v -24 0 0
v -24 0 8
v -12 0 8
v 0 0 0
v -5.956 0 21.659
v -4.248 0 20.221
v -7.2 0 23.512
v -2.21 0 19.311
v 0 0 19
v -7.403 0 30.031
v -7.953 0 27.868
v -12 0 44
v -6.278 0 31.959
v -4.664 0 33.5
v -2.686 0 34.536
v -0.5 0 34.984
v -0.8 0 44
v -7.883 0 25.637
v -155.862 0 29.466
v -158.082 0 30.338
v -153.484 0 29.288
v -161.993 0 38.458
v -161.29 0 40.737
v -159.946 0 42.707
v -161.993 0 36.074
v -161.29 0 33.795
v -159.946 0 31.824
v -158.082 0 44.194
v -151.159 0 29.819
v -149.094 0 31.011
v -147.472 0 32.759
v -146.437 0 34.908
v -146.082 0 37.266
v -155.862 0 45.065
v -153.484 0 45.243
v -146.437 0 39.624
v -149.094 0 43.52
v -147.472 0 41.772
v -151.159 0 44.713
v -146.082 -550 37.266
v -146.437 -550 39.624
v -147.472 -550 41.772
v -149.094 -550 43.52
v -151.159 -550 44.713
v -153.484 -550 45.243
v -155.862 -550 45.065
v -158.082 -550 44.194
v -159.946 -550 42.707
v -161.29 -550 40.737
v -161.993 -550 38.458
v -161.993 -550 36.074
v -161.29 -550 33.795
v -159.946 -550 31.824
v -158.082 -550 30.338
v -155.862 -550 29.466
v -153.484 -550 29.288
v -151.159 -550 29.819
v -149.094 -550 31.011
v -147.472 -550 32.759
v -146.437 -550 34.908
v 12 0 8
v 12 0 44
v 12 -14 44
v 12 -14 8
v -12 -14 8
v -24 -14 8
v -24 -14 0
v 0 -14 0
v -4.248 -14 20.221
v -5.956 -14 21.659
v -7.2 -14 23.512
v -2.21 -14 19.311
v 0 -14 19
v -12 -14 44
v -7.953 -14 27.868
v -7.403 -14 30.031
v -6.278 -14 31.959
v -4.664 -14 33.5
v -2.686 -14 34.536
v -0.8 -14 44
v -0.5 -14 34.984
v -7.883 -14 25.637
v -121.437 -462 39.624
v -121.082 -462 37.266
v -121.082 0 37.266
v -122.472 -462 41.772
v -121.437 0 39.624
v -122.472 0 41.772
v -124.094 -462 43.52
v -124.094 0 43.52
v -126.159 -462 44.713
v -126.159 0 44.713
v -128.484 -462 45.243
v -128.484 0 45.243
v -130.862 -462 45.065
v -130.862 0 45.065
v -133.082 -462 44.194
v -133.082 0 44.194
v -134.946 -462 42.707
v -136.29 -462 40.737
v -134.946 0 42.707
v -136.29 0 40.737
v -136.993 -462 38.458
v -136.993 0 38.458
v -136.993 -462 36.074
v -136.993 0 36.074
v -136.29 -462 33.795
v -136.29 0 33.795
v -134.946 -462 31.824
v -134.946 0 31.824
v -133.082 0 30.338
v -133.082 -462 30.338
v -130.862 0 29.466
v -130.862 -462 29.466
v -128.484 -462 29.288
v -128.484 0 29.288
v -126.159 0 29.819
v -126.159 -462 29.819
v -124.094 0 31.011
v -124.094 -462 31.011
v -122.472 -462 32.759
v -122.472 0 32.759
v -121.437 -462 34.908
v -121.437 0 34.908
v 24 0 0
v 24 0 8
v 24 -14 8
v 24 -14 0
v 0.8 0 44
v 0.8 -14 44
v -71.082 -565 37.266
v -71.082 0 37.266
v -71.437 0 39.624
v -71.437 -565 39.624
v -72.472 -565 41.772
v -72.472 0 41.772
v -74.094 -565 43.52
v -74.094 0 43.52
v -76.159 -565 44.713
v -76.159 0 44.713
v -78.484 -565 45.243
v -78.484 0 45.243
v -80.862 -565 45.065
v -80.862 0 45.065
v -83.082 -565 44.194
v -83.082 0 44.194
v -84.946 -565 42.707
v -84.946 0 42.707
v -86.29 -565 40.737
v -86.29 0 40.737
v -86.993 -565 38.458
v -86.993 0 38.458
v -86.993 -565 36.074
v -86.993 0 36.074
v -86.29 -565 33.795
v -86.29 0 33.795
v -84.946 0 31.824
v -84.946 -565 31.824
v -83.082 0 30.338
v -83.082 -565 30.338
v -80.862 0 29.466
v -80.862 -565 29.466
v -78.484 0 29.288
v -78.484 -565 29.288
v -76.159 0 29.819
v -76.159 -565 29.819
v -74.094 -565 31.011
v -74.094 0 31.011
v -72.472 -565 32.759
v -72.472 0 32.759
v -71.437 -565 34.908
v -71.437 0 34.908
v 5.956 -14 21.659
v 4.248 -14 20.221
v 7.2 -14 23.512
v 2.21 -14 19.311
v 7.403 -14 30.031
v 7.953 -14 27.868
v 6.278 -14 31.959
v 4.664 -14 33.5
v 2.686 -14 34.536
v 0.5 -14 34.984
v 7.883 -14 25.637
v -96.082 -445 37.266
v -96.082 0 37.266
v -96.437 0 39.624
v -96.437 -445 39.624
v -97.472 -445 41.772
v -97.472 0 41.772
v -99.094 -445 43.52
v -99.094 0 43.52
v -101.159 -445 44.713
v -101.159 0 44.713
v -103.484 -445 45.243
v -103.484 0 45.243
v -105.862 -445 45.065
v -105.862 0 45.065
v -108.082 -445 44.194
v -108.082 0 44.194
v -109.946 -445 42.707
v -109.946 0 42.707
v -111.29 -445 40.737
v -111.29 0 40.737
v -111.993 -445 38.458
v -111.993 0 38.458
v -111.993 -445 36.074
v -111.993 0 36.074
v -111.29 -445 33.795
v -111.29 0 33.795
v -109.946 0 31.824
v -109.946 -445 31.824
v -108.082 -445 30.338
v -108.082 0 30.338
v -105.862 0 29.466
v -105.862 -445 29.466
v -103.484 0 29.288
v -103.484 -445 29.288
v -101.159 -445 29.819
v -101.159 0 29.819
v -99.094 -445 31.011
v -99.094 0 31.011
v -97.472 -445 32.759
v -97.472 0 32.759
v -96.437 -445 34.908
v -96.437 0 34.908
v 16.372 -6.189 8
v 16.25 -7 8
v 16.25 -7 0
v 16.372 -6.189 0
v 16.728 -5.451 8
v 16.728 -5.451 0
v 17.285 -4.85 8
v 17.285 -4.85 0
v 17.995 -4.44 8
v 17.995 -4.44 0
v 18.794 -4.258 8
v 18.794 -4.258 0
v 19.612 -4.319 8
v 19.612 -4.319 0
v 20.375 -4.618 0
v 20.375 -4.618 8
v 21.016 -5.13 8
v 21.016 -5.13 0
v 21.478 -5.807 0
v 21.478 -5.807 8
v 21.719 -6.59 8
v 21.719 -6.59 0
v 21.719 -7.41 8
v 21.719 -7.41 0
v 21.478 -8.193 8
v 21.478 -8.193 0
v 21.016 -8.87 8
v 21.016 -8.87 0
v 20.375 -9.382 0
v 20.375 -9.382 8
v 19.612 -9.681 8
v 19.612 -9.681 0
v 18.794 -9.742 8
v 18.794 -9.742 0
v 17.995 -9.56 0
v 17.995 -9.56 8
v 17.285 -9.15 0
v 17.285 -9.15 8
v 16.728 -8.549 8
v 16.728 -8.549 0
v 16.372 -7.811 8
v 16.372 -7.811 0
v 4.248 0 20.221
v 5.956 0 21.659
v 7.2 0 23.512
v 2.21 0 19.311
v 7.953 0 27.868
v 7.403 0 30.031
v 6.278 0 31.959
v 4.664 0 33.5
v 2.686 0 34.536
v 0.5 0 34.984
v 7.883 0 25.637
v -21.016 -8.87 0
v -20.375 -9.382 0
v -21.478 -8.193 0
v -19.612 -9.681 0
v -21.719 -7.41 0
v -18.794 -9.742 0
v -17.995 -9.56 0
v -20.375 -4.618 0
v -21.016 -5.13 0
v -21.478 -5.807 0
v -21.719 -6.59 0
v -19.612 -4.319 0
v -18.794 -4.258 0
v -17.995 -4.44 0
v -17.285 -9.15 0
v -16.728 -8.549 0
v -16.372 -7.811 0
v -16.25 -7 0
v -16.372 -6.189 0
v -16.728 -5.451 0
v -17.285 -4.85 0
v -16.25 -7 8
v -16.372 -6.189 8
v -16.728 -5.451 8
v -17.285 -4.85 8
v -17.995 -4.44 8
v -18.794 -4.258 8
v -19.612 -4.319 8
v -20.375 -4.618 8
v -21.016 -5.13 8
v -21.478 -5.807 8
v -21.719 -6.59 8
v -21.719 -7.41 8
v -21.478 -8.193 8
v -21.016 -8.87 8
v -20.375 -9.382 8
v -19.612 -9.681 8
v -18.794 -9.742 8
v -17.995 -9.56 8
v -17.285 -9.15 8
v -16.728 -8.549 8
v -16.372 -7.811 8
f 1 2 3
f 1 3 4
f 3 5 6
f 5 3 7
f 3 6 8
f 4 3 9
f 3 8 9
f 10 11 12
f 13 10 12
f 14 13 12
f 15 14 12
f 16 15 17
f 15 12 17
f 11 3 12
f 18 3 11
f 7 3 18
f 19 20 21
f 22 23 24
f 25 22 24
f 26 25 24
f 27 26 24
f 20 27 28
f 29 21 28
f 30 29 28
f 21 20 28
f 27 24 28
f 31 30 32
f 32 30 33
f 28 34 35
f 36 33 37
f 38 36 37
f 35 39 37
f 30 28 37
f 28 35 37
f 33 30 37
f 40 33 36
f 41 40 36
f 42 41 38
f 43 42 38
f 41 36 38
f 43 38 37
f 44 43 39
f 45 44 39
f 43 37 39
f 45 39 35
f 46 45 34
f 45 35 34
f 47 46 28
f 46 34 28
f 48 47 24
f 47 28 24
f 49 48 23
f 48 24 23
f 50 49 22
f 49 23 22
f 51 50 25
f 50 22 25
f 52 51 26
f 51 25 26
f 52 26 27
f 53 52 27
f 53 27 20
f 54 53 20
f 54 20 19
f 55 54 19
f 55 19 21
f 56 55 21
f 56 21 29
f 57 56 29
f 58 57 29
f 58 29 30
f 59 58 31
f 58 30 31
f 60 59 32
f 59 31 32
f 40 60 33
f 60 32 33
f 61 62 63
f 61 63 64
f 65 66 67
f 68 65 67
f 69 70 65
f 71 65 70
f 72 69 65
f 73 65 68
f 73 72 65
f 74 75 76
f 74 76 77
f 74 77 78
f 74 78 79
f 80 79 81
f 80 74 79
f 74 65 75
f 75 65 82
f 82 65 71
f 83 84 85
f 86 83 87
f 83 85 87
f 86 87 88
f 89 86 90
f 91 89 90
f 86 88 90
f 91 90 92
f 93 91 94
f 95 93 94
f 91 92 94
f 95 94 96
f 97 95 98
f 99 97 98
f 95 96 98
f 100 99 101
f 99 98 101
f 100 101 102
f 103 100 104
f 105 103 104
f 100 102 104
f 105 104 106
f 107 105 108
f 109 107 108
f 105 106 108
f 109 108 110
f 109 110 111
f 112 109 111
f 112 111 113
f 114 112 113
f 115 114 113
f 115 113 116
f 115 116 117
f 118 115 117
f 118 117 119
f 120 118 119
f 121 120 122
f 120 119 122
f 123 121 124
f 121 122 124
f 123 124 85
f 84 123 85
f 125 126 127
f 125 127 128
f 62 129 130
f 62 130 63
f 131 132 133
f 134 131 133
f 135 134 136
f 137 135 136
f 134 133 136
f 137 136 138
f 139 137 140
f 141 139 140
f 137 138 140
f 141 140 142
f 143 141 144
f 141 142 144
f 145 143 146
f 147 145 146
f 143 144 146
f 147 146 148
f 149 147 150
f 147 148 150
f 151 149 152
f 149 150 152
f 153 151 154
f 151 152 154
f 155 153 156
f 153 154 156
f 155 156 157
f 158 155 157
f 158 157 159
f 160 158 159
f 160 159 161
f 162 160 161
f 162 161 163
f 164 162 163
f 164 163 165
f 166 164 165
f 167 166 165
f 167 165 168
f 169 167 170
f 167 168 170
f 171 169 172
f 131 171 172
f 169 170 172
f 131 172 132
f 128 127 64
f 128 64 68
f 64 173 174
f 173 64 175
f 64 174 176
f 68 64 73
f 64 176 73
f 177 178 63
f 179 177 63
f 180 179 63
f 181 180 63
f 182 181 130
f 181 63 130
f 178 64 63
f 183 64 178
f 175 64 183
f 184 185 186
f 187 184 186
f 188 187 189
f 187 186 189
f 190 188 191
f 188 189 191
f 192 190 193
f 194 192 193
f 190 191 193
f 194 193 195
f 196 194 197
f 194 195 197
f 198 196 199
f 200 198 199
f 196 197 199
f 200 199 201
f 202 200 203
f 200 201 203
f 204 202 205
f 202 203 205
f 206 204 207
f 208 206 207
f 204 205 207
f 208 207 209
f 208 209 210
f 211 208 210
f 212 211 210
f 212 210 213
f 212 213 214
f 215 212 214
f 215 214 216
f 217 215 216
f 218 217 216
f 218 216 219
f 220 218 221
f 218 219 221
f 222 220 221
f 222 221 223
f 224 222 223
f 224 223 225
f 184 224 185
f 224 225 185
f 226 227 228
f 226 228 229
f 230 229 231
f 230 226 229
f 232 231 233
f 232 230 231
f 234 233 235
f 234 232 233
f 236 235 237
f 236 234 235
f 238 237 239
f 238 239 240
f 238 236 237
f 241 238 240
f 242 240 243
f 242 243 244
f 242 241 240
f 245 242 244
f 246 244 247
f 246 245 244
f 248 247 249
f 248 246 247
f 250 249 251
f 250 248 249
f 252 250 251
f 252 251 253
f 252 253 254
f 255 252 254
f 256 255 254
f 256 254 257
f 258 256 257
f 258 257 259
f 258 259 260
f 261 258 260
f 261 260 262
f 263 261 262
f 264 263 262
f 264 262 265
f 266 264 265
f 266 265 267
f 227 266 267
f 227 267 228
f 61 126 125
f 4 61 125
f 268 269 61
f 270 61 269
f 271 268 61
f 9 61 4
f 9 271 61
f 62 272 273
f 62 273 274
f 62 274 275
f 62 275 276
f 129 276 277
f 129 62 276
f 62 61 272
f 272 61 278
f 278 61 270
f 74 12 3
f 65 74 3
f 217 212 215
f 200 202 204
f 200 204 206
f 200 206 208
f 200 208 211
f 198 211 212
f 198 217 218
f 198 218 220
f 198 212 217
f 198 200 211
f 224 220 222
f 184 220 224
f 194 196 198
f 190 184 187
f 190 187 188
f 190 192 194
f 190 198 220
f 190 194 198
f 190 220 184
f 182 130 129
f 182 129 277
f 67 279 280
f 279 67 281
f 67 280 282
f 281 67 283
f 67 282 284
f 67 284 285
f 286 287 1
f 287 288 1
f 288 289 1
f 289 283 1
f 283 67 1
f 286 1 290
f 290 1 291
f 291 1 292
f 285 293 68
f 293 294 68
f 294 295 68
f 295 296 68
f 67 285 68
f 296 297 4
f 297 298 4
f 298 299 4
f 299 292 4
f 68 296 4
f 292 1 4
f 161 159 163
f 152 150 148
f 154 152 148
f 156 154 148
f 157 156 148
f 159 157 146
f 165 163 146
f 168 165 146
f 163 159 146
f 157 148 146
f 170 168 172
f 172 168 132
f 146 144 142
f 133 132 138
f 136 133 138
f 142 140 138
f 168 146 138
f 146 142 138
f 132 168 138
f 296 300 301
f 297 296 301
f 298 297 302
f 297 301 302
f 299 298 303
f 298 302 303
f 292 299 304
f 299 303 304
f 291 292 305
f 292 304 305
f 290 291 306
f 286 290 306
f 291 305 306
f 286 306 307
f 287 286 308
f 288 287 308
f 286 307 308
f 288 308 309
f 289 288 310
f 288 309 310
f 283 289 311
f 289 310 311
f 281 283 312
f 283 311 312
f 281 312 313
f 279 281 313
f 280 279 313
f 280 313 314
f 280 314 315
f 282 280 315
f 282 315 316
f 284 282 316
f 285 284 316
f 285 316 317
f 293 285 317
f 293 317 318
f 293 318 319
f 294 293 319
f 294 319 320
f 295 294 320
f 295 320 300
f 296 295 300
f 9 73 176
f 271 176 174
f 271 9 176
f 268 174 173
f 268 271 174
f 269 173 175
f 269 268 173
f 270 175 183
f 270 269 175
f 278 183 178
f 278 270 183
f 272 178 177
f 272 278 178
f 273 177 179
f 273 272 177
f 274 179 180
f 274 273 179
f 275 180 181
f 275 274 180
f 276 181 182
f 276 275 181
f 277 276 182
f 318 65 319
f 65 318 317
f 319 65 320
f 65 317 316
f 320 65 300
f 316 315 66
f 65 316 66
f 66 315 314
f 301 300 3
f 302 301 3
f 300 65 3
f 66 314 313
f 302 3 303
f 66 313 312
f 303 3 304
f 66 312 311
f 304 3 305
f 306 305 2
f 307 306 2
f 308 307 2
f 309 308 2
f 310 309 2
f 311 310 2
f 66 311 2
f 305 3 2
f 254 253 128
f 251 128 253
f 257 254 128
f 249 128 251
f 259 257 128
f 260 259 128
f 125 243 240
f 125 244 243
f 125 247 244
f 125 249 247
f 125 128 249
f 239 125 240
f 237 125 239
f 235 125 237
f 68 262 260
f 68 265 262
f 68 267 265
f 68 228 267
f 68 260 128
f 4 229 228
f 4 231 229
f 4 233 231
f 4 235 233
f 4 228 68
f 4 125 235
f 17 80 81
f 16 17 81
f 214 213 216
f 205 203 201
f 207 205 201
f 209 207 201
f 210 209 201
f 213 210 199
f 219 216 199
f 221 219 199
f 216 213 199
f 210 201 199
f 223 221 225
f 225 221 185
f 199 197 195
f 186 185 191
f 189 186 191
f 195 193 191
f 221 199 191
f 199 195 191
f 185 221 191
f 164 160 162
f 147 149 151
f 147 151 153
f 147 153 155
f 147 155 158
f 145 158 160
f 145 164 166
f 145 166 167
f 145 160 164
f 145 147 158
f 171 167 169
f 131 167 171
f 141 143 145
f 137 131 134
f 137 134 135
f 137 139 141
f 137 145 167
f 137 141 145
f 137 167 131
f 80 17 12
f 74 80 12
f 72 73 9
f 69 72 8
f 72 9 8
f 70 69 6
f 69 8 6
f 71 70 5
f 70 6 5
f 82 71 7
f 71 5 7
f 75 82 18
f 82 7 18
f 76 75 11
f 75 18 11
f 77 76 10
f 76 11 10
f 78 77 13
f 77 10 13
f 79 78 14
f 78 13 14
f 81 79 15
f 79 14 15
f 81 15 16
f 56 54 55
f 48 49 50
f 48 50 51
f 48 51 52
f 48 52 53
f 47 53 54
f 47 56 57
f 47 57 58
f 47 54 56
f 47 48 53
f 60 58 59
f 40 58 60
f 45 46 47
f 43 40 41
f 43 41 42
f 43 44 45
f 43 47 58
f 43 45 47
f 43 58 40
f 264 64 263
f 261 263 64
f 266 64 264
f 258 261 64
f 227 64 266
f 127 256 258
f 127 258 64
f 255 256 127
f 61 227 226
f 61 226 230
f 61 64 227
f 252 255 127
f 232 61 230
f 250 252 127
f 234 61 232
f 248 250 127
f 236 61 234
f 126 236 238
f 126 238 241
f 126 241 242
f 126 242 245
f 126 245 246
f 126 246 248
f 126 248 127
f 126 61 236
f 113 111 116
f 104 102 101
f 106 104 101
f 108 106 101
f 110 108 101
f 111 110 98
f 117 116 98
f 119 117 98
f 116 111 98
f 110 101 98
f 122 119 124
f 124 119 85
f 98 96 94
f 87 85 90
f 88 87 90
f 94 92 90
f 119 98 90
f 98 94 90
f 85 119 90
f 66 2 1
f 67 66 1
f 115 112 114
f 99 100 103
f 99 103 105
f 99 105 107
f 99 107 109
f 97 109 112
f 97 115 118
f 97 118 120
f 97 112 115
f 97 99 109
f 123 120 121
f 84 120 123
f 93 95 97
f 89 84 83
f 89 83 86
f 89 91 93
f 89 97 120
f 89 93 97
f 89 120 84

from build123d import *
from build123d import SkipClean  # not in build123d's __all__

# Parameters (mm, degrees)
F1_DEPTH  = 14
F2_R      = 2.75
F3_DEPTH  = 25
F5_DEPTH  = 25
F7_R      = 8
F8_DEPTH  = 550
F9_DEPTH  = 462
F10_DEPTH = 445
F11_DEPTH = 565


with BuildPart() as f1:
    # F0 (on Front) → F1 (new body)
    with BuildSketch(Plane.XZ):
        with BuildLine():
            Line((-24, 8), (-24, 0))
            Line((-24, 0), (0, 0))
            Line((0, 0), (0, 19))
            ThreePointArc((0, 19), (-8, 27), (0, 35))
            Line((0, 35), (0, 44))
            Line((0, 44), (-12, 44))
            Line((-12, 44), (-12, 8))
            Line((-12, 8), (-24, 8))
        make_face()
    extrude(amount=F1_DEPTH)

    # F2 (on face) → F3 (cut)
    with BuildSketch(Plane.XY.offset(8)):
        with Locations((-19, -7)):
            Circle(F2_R)
    extrude(amount=-F3_DEPTH, mode=Mode.SUBTRACT)

    # F4 (on face) → F5 (cut)
    with BuildSketch(Plane.XZ.offset(14)):
        with BuildLine():
            Line((0, 44), (-0.8, 44))
            Line((-0.8, 44), (-0.4997557997, 34.984375))
            ThreePointArc((-0.4997557997, 34.984375), (-0.25, 34.9960927959), (0, 35))
            Line((0, 35), (0, 44))
        make_face()
    extrude(amount=-F5_DEPTH, mode=Mode.SUBTRACT)

    # F6: F1 across face


with BuildPart() as f1_1:
    add(f1.part, clean=False)
    with SkipClean():  # cleaning this boolean's faces spoils the solid; the shape is the same uncleaned
        add(f1.part.mirror(Plane(origin=(0, -7, 9.5), x_dir=(0, 1, 0), z_dir=(1, 0, 0))), clean=False)


with BuildPart() as f8:
    # F7 (on Front) → F8 (new body)
    with BuildSketch(Plane.XZ):
        with Locations((-154.0818959475, 37.2658409178)):
            Circle(F7_R)
    extrude(amount=F8_DEPTH)


with BuildPart() as f9:
    # F7 (on Front) → F9 (new body)
    with BuildSketch(Plane.XZ):
        with Locations((-129.0818959475, 37.2658409178)):
            Circle(F7_R)
    extrude(amount=F9_DEPTH)


with BuildPart() as f10:
    # F7 (on Front) → F10 (new body)
    with BuildSketch(Plane.XZ):
        with Locations((-104.0818959475, 37.2658409178)):
            Circle(F7_R)
    extrude(amount=F10_DEPTH)


with BuildPart() as f11:
    # F7 (on Front) → F11 (new body)
    with BuildSketch(Plane.XZ):
        with Locations((-79.0818959475, 37.2658409178)):
            Circle(F7_R)
    extrude(amount=F11_DEPTH)


solid = Compound([f1_1.part, f8.part, f9.part, f10.part, f11.part])
